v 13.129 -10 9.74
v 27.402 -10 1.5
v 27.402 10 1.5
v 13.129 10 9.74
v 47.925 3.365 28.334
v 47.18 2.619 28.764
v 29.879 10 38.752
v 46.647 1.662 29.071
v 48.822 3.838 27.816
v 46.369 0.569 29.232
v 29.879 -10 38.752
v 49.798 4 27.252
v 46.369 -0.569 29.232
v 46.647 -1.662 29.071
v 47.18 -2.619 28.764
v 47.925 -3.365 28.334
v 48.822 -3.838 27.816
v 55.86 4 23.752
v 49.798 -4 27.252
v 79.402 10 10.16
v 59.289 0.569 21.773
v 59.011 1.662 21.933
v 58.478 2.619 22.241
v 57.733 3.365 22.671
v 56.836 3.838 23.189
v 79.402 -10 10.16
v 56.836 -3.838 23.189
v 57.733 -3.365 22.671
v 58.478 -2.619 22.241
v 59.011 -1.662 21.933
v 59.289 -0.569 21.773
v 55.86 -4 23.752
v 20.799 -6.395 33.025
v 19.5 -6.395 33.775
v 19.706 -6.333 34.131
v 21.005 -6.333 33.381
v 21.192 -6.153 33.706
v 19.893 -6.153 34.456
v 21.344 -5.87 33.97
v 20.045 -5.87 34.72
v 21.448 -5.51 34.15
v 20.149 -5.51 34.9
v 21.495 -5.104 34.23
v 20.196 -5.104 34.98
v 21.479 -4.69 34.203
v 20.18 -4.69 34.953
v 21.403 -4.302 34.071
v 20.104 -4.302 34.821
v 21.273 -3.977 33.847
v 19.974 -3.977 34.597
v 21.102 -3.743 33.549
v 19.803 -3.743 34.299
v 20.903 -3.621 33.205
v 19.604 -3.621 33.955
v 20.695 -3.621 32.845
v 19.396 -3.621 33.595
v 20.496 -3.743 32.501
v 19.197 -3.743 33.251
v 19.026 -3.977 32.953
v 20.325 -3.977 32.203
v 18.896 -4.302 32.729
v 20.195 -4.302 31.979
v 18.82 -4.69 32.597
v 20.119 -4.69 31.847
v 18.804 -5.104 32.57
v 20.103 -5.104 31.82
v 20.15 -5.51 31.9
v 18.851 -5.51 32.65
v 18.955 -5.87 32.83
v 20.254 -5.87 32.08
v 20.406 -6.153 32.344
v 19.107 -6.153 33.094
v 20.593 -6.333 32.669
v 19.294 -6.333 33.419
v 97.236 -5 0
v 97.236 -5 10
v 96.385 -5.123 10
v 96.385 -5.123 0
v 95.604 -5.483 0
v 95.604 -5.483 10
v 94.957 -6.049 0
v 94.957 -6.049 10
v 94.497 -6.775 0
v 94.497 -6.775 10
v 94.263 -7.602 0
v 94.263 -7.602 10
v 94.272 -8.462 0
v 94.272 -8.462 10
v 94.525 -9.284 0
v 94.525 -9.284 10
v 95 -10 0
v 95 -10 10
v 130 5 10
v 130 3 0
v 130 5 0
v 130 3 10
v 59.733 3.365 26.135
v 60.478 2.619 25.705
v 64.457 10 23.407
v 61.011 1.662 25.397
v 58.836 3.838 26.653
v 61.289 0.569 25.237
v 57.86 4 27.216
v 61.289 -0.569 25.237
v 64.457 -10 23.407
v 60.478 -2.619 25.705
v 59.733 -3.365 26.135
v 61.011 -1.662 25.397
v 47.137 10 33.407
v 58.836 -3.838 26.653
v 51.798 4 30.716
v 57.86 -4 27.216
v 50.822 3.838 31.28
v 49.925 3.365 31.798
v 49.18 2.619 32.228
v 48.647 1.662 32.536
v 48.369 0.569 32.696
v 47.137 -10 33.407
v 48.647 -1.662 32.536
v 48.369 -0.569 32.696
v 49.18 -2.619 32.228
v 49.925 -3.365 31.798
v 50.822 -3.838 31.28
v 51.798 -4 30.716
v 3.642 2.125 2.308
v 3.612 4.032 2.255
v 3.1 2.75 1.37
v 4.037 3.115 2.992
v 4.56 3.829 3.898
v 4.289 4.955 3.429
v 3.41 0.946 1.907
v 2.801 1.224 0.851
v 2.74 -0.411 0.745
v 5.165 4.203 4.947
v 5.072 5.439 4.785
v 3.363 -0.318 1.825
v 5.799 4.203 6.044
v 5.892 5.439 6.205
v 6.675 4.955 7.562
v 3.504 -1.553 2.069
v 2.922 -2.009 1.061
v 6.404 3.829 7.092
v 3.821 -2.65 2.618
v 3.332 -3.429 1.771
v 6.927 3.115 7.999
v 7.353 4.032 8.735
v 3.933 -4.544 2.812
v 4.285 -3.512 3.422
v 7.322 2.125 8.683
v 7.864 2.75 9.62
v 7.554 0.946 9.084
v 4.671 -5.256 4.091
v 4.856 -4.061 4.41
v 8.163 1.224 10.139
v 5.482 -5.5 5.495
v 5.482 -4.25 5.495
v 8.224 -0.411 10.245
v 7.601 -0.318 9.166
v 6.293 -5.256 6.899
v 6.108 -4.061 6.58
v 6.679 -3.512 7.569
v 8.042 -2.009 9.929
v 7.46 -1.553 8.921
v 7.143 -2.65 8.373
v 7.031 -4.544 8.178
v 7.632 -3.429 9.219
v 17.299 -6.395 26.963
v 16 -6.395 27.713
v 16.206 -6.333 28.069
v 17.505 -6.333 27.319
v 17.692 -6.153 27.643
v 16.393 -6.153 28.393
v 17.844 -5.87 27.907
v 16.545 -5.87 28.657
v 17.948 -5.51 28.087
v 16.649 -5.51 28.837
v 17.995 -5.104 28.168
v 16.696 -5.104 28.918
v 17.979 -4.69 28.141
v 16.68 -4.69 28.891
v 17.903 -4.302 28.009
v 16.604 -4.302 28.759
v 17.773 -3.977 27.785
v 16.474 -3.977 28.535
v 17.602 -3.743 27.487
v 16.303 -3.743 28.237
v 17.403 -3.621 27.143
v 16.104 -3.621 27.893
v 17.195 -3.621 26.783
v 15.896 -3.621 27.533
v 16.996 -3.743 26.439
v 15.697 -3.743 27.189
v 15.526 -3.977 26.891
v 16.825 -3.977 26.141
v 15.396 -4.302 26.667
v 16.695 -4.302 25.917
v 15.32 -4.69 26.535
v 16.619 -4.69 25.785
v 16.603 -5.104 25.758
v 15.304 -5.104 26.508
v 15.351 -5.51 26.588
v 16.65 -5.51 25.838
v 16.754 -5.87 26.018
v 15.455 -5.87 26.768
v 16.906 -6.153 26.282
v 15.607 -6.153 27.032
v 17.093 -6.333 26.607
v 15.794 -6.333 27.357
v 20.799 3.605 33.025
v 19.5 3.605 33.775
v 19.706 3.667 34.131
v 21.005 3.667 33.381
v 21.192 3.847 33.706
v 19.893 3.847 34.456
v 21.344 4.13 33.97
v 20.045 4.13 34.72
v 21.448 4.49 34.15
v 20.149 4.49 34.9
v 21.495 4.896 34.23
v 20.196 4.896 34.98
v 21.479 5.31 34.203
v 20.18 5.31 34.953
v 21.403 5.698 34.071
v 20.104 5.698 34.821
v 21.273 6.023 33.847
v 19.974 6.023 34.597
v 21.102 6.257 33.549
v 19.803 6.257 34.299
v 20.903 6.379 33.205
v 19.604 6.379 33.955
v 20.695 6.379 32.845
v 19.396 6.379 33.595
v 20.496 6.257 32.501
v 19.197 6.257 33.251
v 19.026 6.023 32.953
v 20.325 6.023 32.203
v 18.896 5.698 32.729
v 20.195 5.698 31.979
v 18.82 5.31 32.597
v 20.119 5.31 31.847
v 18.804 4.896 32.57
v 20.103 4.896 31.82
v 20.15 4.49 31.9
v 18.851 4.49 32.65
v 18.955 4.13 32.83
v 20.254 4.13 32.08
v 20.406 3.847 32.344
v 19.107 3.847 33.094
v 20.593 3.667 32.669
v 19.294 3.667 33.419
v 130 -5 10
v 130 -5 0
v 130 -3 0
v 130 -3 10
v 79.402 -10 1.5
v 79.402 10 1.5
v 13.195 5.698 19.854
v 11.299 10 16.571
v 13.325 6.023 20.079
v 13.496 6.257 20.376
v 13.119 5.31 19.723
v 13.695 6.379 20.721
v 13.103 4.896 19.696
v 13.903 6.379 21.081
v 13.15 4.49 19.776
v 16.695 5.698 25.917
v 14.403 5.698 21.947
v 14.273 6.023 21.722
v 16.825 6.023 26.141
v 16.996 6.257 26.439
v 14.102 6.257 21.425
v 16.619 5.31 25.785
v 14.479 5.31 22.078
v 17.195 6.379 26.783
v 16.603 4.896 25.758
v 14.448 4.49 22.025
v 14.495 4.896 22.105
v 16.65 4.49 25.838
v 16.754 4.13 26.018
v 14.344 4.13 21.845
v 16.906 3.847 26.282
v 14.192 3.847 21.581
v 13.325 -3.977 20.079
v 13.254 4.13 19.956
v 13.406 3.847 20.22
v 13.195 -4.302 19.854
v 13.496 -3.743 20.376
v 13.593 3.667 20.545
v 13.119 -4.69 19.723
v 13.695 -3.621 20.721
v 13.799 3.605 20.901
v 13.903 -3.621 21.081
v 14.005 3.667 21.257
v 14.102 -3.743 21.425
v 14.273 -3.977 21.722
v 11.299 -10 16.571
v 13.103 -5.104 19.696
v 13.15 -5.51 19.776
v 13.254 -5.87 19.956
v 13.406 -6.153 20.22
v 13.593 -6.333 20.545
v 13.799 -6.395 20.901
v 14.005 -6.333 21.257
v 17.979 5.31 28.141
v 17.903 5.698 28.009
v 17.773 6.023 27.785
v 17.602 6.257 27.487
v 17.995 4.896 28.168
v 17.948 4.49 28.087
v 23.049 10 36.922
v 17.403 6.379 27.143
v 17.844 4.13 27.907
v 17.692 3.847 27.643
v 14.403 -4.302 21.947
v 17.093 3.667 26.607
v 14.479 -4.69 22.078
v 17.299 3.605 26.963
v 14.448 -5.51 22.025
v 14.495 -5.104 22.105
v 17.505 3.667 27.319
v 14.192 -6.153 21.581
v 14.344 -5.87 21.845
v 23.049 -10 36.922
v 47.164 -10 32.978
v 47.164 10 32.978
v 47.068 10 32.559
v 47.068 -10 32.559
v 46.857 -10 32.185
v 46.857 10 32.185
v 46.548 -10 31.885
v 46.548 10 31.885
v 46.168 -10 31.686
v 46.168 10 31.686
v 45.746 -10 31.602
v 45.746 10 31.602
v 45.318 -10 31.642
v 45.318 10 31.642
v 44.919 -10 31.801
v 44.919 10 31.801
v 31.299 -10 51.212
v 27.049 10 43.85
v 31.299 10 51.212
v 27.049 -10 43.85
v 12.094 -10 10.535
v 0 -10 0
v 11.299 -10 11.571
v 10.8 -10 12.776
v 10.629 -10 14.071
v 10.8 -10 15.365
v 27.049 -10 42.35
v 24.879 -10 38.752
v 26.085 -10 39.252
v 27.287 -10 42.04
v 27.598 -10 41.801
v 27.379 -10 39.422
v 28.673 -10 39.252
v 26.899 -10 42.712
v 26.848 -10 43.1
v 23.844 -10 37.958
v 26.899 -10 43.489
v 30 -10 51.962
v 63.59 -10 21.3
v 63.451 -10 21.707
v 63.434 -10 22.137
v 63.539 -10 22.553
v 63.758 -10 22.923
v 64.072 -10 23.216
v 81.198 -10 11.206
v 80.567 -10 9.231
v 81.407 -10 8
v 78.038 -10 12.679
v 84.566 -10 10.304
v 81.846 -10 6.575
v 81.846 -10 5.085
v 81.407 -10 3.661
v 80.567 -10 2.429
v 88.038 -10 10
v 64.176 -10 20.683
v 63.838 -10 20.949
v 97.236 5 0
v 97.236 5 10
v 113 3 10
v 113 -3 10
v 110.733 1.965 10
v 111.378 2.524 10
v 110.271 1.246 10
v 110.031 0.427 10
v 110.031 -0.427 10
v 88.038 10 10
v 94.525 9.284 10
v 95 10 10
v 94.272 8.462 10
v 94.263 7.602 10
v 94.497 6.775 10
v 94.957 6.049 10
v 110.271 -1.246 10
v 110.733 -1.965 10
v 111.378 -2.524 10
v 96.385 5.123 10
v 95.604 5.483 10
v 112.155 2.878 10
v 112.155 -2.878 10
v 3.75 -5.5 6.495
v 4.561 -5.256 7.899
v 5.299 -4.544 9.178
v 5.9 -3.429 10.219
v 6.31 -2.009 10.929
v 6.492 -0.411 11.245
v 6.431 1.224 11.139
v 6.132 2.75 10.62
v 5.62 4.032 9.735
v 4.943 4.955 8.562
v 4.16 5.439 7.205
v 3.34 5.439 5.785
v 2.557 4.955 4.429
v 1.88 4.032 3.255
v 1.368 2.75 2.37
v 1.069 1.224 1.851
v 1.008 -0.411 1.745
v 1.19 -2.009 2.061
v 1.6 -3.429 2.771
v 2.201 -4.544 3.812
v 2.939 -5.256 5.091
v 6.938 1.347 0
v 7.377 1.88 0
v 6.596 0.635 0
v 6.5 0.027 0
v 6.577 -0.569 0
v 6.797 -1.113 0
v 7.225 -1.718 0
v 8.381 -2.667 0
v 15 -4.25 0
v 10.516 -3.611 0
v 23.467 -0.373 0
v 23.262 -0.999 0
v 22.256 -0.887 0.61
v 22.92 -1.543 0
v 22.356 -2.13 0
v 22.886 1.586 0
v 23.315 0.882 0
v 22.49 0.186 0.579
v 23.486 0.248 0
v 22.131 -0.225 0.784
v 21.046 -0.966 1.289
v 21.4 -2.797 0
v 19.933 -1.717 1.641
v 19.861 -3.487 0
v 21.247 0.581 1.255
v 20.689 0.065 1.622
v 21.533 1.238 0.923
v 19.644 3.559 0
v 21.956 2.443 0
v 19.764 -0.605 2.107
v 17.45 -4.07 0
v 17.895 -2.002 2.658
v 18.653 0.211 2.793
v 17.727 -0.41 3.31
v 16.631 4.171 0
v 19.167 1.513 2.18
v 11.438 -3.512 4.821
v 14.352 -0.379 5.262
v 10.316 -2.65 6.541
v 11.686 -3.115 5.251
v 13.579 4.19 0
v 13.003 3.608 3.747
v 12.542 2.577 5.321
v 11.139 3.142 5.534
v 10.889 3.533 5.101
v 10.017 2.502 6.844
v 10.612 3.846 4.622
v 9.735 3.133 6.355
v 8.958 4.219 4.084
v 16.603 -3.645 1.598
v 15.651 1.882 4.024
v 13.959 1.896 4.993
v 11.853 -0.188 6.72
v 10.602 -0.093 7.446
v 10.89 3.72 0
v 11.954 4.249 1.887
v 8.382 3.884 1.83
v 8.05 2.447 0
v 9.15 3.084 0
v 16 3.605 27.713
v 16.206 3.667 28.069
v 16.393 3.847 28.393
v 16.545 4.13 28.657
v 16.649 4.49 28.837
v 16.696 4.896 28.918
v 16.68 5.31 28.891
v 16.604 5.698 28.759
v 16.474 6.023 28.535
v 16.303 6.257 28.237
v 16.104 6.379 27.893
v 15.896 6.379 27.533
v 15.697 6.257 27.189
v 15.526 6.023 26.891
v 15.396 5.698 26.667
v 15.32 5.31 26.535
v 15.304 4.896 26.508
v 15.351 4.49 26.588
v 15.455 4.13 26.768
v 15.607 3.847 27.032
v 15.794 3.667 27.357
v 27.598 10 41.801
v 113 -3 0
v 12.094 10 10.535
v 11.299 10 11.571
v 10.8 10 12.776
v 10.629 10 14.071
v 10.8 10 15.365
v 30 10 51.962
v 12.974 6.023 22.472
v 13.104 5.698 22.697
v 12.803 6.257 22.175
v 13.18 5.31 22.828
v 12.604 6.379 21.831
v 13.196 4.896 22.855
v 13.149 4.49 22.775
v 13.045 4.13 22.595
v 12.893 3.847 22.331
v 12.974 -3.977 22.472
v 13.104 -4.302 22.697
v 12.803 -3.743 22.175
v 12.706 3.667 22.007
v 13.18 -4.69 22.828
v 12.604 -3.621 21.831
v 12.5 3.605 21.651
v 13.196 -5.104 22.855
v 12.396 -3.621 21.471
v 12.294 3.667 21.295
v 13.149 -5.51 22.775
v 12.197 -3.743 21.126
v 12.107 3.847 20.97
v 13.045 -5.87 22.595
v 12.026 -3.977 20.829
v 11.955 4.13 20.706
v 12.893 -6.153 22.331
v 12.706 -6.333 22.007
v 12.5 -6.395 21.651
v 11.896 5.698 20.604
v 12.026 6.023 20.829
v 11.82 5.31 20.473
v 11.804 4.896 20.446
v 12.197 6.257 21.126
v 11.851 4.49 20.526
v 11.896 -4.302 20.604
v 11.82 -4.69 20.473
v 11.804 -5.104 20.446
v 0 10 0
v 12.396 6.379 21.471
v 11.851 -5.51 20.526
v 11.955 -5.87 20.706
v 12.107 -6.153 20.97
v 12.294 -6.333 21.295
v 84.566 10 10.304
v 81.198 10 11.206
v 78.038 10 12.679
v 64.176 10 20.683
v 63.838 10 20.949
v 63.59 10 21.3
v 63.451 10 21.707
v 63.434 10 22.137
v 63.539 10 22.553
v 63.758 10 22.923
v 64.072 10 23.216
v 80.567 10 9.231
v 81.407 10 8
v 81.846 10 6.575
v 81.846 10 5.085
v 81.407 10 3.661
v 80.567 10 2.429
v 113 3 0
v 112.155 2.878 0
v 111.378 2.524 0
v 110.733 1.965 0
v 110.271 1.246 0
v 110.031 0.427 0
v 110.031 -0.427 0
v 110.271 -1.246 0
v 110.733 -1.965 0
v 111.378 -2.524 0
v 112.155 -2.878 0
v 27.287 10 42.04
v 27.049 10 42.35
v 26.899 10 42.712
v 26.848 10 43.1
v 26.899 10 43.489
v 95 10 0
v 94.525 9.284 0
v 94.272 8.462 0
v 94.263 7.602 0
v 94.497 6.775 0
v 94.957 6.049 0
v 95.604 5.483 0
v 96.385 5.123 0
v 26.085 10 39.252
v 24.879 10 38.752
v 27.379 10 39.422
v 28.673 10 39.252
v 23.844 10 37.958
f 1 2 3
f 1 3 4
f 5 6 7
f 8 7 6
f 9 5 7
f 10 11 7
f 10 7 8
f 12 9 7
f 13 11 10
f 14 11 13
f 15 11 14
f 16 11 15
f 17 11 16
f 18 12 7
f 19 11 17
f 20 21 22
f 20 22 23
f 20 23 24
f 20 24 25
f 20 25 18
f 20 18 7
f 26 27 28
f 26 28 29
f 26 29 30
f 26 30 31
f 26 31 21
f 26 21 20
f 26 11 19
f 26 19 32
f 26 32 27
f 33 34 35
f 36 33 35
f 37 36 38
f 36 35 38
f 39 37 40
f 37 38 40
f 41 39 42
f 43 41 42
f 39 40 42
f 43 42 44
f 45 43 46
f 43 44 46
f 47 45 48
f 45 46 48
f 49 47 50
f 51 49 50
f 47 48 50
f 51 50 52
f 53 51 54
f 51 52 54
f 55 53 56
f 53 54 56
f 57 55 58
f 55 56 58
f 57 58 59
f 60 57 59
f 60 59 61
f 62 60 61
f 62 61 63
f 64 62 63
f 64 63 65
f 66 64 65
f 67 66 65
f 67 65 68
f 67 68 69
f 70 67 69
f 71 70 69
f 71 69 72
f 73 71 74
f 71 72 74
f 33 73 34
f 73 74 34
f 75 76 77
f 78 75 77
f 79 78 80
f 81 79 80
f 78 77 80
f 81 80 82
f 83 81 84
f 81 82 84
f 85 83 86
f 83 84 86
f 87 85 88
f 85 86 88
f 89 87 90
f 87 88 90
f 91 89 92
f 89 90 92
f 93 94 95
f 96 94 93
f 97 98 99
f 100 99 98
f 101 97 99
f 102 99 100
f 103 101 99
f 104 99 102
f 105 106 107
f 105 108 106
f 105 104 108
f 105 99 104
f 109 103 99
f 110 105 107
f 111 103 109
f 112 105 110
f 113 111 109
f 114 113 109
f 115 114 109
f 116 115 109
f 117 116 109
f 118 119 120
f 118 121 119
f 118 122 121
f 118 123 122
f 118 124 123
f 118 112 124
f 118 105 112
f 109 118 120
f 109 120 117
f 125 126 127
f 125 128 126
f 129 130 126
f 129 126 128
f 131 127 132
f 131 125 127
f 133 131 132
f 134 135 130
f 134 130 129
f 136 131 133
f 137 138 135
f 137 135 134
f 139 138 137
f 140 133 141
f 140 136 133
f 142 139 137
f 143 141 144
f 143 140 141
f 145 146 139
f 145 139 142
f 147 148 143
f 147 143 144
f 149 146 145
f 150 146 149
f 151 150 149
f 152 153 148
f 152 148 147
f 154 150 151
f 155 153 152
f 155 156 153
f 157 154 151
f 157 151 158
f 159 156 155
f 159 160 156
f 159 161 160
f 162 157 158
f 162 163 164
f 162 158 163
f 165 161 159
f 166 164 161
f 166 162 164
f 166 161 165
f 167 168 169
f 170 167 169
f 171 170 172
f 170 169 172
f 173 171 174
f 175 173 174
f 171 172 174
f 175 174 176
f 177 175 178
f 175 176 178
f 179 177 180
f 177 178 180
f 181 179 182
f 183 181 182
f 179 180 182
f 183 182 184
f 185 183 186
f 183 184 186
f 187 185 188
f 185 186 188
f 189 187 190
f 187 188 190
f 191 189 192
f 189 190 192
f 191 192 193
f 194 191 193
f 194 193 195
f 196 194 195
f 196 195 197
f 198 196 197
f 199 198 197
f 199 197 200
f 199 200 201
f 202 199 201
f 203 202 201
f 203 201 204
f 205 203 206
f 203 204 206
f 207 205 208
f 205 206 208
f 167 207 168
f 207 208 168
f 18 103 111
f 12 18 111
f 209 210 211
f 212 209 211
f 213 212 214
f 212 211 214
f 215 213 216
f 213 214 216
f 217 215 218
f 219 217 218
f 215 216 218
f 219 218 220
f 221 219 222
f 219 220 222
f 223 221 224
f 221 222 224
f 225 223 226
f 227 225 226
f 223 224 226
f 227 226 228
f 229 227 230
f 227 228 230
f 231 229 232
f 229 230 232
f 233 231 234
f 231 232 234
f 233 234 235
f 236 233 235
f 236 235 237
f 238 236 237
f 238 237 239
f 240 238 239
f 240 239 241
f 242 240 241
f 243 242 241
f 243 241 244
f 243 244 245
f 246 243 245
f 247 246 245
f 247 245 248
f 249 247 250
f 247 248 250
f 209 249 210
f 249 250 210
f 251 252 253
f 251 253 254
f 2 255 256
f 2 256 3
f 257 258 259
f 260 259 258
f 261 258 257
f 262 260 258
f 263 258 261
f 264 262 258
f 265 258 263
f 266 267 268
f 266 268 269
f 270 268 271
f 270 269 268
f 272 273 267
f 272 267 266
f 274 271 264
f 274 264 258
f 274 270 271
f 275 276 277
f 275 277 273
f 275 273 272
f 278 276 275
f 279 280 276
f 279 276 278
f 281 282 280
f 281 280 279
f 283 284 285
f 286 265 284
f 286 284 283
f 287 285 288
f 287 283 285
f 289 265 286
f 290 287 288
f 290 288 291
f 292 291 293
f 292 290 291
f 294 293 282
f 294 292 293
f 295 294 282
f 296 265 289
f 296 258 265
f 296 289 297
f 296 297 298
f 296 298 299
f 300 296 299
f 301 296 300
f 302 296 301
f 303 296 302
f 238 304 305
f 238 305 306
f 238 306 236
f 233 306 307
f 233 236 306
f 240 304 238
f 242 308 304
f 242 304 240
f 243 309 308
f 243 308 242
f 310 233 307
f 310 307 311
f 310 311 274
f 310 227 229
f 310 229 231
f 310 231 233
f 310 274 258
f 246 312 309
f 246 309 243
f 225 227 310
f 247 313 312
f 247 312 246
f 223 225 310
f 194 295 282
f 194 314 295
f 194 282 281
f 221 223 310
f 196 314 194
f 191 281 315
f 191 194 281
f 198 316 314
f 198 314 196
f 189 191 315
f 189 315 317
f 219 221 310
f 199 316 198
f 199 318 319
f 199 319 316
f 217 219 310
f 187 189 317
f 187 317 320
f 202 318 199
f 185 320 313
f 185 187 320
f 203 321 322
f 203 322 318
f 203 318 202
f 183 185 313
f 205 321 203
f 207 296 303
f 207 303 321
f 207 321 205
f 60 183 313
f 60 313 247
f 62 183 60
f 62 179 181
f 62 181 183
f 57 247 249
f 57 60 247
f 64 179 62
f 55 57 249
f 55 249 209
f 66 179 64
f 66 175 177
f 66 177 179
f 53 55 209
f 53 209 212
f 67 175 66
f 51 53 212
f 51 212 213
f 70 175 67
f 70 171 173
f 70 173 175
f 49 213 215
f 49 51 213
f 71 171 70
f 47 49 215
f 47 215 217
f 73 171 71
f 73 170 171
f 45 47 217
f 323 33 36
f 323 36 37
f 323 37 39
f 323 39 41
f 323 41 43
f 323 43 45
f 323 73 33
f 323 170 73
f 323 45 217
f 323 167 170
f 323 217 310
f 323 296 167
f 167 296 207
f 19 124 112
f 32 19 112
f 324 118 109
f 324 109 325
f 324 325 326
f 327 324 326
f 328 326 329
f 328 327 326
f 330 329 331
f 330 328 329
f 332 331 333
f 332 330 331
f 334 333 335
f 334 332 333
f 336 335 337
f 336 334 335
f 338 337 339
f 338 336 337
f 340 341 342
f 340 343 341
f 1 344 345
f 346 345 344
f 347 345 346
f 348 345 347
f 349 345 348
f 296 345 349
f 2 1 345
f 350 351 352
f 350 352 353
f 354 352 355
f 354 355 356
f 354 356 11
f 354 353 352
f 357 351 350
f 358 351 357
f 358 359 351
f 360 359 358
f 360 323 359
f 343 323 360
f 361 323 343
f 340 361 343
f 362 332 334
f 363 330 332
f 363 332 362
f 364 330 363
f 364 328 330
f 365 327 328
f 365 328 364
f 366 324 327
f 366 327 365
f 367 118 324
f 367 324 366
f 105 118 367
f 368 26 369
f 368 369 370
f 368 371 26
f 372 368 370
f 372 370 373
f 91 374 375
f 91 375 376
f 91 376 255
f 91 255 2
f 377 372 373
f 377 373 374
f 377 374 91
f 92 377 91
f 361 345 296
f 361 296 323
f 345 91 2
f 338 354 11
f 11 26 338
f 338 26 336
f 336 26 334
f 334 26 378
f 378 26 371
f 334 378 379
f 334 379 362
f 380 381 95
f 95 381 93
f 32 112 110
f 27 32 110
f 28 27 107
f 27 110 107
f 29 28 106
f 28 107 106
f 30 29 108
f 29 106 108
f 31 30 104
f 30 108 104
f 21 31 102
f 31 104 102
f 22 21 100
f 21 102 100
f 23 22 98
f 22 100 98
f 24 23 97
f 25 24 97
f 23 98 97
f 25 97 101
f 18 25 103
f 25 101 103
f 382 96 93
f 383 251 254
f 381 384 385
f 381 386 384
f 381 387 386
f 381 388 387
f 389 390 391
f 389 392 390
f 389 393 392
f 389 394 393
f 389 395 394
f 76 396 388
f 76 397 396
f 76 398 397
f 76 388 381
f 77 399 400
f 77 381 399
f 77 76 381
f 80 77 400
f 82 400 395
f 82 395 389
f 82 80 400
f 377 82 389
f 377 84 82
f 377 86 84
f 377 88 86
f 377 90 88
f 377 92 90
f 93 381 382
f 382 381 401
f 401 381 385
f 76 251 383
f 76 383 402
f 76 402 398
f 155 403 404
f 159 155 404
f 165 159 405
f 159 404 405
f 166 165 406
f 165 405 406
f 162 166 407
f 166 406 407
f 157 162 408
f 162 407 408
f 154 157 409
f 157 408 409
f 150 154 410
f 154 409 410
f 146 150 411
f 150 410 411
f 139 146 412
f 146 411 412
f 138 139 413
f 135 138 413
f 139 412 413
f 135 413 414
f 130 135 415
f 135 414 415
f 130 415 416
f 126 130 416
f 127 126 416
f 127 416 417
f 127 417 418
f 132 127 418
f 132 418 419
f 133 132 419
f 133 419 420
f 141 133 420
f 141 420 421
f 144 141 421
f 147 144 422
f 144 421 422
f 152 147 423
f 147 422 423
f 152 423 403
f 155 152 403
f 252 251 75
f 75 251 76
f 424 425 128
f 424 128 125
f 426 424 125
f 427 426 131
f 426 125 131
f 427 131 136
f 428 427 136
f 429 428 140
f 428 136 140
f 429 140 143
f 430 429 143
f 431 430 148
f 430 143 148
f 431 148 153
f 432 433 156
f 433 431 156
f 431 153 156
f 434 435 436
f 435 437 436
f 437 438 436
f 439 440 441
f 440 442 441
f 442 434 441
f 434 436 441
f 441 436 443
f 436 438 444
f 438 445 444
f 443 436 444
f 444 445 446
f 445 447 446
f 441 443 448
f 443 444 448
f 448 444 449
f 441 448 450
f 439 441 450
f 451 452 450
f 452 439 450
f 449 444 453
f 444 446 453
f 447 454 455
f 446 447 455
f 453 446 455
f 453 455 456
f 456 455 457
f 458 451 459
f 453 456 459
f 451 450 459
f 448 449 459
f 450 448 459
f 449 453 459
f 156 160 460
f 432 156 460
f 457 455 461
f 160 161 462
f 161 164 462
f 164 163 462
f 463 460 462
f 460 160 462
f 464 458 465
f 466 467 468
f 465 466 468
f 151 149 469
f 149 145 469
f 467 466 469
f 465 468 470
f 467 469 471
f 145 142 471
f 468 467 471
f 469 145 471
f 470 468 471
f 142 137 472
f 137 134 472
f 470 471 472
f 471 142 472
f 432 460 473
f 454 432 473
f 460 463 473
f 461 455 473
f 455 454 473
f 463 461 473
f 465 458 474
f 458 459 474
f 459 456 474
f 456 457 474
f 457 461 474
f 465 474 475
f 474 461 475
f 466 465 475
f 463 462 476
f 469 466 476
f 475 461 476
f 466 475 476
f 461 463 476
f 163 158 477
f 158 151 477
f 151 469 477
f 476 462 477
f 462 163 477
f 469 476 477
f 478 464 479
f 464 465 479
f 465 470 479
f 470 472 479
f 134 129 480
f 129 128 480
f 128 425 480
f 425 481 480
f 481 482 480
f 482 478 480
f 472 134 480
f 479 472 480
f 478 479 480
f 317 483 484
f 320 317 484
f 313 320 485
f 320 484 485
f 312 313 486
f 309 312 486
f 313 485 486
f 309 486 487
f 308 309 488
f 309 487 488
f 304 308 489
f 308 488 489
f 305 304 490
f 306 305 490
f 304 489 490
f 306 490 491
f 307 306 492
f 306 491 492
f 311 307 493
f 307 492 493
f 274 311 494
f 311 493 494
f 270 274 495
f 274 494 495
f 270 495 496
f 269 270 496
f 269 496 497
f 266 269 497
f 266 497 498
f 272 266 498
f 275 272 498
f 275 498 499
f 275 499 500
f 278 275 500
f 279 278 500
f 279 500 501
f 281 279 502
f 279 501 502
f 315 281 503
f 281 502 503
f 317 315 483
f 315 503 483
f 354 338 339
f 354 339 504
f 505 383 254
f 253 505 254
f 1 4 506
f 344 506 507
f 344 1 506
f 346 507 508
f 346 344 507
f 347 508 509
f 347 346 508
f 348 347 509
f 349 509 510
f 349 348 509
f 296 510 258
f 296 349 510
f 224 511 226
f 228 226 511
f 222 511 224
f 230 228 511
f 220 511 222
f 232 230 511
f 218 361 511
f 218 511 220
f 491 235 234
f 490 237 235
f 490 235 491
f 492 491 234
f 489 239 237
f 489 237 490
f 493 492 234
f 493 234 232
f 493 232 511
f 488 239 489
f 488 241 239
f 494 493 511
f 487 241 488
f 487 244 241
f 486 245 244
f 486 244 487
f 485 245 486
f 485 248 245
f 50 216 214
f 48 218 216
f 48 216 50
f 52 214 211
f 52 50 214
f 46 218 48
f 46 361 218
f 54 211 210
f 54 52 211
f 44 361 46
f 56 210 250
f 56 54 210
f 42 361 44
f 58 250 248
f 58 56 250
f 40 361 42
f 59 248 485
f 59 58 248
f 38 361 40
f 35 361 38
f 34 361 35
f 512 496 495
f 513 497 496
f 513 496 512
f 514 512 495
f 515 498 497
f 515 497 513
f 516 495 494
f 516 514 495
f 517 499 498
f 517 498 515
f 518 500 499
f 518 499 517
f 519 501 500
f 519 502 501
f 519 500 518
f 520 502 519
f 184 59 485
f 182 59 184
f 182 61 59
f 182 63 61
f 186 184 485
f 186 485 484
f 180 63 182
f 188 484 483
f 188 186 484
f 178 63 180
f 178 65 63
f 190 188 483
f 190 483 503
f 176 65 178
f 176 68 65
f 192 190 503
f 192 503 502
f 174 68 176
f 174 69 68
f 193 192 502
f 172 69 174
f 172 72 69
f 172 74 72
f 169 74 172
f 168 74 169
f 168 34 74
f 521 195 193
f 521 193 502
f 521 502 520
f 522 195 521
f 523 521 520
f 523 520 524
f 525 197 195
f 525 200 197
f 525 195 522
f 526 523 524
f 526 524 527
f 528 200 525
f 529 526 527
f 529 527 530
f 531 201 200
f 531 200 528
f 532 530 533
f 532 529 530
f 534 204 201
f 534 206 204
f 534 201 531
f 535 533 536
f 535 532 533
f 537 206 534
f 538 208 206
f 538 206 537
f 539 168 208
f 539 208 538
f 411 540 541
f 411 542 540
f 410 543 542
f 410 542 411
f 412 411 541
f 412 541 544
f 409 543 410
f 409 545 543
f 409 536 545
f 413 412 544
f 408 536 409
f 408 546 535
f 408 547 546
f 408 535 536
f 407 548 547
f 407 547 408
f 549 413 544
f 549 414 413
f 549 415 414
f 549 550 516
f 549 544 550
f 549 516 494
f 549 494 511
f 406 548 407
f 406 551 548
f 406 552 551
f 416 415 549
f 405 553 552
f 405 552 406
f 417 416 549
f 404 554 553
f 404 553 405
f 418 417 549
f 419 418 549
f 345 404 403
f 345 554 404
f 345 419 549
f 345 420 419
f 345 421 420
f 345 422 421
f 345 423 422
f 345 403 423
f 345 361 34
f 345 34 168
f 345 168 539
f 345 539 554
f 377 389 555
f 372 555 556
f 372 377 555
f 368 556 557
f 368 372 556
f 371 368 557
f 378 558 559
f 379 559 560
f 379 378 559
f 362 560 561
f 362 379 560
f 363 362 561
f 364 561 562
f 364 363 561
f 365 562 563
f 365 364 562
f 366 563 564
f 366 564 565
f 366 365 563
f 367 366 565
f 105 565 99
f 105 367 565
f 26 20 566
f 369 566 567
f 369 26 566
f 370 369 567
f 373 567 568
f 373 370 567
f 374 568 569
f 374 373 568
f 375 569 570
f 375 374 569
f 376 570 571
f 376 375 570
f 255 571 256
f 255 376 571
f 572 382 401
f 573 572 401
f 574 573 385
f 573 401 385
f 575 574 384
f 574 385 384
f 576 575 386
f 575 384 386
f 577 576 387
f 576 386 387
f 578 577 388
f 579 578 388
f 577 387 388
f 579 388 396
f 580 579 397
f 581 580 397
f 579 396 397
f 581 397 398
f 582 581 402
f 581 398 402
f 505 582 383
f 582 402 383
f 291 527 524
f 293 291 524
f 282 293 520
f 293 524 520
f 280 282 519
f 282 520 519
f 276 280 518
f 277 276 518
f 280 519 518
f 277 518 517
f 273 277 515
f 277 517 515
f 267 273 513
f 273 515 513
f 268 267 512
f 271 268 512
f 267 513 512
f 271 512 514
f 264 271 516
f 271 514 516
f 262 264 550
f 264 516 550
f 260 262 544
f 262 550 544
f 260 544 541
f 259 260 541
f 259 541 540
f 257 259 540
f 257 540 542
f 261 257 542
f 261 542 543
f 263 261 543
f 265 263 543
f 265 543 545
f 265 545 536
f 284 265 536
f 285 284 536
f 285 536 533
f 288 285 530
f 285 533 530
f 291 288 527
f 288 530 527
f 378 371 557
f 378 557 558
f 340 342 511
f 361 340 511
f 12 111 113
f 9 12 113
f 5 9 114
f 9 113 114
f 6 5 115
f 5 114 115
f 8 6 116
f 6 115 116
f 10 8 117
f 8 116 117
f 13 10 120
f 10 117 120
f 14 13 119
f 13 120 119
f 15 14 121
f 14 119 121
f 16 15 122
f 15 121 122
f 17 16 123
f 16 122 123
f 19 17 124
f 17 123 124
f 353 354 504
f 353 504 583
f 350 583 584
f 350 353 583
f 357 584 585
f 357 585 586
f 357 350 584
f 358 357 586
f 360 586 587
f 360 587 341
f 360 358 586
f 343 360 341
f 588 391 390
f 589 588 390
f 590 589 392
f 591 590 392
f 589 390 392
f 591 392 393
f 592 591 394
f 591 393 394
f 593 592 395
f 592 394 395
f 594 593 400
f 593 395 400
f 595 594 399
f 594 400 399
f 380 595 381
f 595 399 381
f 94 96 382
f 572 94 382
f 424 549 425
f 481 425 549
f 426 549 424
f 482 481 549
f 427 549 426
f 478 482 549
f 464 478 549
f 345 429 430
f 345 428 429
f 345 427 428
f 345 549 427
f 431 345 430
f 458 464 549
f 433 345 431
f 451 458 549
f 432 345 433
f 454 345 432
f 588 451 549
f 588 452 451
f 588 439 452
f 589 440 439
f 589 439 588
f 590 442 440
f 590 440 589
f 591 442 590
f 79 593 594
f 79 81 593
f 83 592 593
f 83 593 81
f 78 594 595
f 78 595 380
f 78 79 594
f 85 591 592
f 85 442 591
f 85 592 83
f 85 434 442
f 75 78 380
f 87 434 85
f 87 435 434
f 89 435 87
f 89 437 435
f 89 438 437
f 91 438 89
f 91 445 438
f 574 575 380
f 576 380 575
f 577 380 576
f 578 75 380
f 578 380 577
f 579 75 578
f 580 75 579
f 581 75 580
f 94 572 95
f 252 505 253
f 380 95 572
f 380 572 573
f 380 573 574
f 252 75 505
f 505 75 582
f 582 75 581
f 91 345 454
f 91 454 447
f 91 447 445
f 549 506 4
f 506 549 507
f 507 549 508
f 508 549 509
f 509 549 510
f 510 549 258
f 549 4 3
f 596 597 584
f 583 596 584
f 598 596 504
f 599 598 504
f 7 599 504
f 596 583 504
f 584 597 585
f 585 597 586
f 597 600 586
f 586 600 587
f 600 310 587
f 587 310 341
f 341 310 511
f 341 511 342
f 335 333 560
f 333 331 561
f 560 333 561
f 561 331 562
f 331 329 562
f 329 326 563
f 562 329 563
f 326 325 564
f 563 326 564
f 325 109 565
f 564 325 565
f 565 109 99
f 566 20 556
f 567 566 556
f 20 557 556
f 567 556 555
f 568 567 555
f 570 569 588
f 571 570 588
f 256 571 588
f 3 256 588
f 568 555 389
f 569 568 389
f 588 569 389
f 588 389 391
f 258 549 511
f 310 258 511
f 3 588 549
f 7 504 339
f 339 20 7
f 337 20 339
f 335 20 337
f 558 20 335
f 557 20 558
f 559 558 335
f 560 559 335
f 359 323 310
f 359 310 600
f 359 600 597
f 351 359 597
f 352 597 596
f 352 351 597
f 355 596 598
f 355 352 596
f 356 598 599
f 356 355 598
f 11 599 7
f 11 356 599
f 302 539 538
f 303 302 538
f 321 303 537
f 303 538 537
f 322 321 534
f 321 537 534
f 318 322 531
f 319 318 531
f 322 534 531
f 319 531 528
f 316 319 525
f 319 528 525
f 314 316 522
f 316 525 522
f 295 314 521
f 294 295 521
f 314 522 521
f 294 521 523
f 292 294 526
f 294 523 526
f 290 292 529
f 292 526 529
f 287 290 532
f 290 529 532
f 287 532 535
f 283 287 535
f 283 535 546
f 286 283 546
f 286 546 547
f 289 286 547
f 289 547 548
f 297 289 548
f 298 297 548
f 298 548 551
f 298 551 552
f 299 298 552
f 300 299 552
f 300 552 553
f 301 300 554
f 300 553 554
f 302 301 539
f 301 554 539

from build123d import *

# Parameters (mm, degrees)
F0_W     = 35
F0_H     = 10
F1_DEPTH = 10
F3_DEPTH = 4
F4_R     = 1.395
F5_DEPTH = 1.5
F4_R_2   = 5.5
F4_R_3   = 4.25
F6_DEPTH = 2
F7_DEPTH = 112.584302492
F9_DEPTH = 10.001


with BuildPart() as f1:
    # F0 (on Front) → F1 (new body, symmetric)
    with BuildSketch(Plane.XZ):
        with BuildLine():
            Line((30, 51.9615242271), (0, 0))
            Line((0, 0), (95, 0))
            Line((95, 0), (95, 10))
            Line((95, 10), (88.0384757729, 10))
            ThreePointArc((88.0384757729, 10), (82.8620948709, 10.6814834742), (78.0384757729, 12.6794919243))
            Line((78.0384757729, 12.6794919243), (64.1755840358, 20.6832362005))
            ThreePointArc((64.1755840358, 20.6832362005), (63.4335436954, 22.1365974171), (64.4573381993, 23.4073167043))
            Line((64.4573381993, 23.4073167043), (47.1368301236, 33.4073167043))
            ThreePointArc((47.1368301236, 33.4073167043), (46.5482521918, 31.8853250121), (44.918584287, 31.8012701892))
            Line((44.918584287, 31.8012701892), (27.5980762114, 41.8012701892))
            ThreePointArc((27.5980762114, 41.8012701892), (26.8991874719, 42.7120797272), (27.0490381057, 43.8503082949))
            Line((27.0490381057, 43.8503082949), (31.2990381057, 51.2115242271))
            Line((31.2990381057, 51.2115242271), (30, 51.9615242271))
        make_face()
        with BuildLine():
            Line((11.2990381057, 16.5705080757), (23.0490381057, 36.9221050646))
            ThreePointArc((23.0490381057, 36.9221050646), (26.0850698991, 39.2517341961), (29.8791651246, 38.7522320835))
            Line((29.8791651246, 38.7522320835), (79.4019237886, 10.1602540378))
            ThreePointArc((79.4019237886, 10.1602540378), (81.9019237886, 5.8301270189), (79.4019237886, 1.5))
            Line((79.4019237886, 1.5), (27.4019237886, 1.5))
            Line((27.4019237886, 1.5), (13.1291651246, 9.7403810568))
            ThreePointArc((13.1291651246, 9.7403810568), (10.7995359932, 12.7764128502), (11.2990381057, 16.5705080757))
        make_face(mode=Mode.SUBTRACT)
        with Locations((112.5, 5)):
            Rectangle(F0_W, F0_H)
    extrude(amount=F1_DEPTH, both=True)

    # F2 (on face) → F3 (cut)
    with BuildSketch(Plane(origin=(26.25, 0, 45.4663336987), x_dir=(0.8660254038, 0, -0.5), z_dir=(0.5, 0, 0.8660254038))):
        with BuildLine():
            ThreePointArc((29.5, 4), (25.5, 0), (29.5, -4))
            Line((29.5, -4), (36.5, -4))
            ThreePointArc((36.5, -4), (40.5, 0), (36.5, 4))
            Line((36.5, 4), (29.5, 4))
        make_face()
    extrude(amount=-F3_DEPTH, mode=Mode.SUBTRACT)

    # F4 (on face) → F5 (cut)
    with BuildSketch(Plane(origin=(0, 0, 0), x_dir=(0, -1, 0), z_dir=(-0.8660254038, 0, 0.5))):
        with Locations((-5, 39)):
            Circle(F4_R)
        with Locations((-5, 32)):
            Circle(F4_R)
        with Locations((5, 25)):
            Circle(F4_R)
        with Locations((5, 32)):
            Circle(F4_R)
        with Locations((5, 39)):
            Circle(F4_R)
        with Locations((-5, 25)):
            Circle(F4_R)
    extrude(amount=-F5_DEPTH, mode=Mode.SUBTRACT)

    # F4 (on face) → F6 (cut)
    with BuildSketch(Plane(origin=(0, 0, 0), x_dir=(0, -1, 0), z_dir=(-0.8660254038, 0, 0.5))):
        with Locations((0, 7.5)):
            Circle(F4_R_2)
        with Locations((0, 7.5)):
            Circle(F4_R_3, mode=Mode.SUBTRACT)
    extrude(amount=-F6_DEPTH, mode=Mode.SUBTRACT)

    # F7 (cut, through all): a face of the model
    f7_faces = [f1.faces().sort_by_distance(p)[0] for p in [
        (3.75, 0, 6.4951905284),
    ]]
    extrude(f7_faces, amount=-F7_DEPTH, mode=Mode.SUBTRACT)

    # F8 (on face) → F9 (cut, through all)
    with BuildSketch(Plane.XY.offset(10)):
        with BuildLine():
            Line((130, -10), (130, -5))
            Line((130, -5), (97.2360679775, -5))
            ThreePointArc((97.2360679775, -5), (94.49745519, -6.7752551286), (95, -10))
            Line((95, -10), (130, -10))
        make_face()
        with BuildLine():
            Line((130, -3), (130, 3))
            Line((130, 3), (113, 3))
            ThreePointArc((113, 3), (110, 0), (113, -3))
            Line((113, -3), (130, -3))
        make_face()
        with BuildLine():
            Line((97.2360679775, 5), (130, 5))
            Line((130, 5), (130, 10))
            Line((130, 10), (95, 10))
            ThreePointArc((95, 10), (94.49745519, 6.7752551286), (97.2360679775, 5))
        make_face()
    extrude(amount=-F9_DEPTH, mode=Mode.SUBTRACT)


solid = f1.part
